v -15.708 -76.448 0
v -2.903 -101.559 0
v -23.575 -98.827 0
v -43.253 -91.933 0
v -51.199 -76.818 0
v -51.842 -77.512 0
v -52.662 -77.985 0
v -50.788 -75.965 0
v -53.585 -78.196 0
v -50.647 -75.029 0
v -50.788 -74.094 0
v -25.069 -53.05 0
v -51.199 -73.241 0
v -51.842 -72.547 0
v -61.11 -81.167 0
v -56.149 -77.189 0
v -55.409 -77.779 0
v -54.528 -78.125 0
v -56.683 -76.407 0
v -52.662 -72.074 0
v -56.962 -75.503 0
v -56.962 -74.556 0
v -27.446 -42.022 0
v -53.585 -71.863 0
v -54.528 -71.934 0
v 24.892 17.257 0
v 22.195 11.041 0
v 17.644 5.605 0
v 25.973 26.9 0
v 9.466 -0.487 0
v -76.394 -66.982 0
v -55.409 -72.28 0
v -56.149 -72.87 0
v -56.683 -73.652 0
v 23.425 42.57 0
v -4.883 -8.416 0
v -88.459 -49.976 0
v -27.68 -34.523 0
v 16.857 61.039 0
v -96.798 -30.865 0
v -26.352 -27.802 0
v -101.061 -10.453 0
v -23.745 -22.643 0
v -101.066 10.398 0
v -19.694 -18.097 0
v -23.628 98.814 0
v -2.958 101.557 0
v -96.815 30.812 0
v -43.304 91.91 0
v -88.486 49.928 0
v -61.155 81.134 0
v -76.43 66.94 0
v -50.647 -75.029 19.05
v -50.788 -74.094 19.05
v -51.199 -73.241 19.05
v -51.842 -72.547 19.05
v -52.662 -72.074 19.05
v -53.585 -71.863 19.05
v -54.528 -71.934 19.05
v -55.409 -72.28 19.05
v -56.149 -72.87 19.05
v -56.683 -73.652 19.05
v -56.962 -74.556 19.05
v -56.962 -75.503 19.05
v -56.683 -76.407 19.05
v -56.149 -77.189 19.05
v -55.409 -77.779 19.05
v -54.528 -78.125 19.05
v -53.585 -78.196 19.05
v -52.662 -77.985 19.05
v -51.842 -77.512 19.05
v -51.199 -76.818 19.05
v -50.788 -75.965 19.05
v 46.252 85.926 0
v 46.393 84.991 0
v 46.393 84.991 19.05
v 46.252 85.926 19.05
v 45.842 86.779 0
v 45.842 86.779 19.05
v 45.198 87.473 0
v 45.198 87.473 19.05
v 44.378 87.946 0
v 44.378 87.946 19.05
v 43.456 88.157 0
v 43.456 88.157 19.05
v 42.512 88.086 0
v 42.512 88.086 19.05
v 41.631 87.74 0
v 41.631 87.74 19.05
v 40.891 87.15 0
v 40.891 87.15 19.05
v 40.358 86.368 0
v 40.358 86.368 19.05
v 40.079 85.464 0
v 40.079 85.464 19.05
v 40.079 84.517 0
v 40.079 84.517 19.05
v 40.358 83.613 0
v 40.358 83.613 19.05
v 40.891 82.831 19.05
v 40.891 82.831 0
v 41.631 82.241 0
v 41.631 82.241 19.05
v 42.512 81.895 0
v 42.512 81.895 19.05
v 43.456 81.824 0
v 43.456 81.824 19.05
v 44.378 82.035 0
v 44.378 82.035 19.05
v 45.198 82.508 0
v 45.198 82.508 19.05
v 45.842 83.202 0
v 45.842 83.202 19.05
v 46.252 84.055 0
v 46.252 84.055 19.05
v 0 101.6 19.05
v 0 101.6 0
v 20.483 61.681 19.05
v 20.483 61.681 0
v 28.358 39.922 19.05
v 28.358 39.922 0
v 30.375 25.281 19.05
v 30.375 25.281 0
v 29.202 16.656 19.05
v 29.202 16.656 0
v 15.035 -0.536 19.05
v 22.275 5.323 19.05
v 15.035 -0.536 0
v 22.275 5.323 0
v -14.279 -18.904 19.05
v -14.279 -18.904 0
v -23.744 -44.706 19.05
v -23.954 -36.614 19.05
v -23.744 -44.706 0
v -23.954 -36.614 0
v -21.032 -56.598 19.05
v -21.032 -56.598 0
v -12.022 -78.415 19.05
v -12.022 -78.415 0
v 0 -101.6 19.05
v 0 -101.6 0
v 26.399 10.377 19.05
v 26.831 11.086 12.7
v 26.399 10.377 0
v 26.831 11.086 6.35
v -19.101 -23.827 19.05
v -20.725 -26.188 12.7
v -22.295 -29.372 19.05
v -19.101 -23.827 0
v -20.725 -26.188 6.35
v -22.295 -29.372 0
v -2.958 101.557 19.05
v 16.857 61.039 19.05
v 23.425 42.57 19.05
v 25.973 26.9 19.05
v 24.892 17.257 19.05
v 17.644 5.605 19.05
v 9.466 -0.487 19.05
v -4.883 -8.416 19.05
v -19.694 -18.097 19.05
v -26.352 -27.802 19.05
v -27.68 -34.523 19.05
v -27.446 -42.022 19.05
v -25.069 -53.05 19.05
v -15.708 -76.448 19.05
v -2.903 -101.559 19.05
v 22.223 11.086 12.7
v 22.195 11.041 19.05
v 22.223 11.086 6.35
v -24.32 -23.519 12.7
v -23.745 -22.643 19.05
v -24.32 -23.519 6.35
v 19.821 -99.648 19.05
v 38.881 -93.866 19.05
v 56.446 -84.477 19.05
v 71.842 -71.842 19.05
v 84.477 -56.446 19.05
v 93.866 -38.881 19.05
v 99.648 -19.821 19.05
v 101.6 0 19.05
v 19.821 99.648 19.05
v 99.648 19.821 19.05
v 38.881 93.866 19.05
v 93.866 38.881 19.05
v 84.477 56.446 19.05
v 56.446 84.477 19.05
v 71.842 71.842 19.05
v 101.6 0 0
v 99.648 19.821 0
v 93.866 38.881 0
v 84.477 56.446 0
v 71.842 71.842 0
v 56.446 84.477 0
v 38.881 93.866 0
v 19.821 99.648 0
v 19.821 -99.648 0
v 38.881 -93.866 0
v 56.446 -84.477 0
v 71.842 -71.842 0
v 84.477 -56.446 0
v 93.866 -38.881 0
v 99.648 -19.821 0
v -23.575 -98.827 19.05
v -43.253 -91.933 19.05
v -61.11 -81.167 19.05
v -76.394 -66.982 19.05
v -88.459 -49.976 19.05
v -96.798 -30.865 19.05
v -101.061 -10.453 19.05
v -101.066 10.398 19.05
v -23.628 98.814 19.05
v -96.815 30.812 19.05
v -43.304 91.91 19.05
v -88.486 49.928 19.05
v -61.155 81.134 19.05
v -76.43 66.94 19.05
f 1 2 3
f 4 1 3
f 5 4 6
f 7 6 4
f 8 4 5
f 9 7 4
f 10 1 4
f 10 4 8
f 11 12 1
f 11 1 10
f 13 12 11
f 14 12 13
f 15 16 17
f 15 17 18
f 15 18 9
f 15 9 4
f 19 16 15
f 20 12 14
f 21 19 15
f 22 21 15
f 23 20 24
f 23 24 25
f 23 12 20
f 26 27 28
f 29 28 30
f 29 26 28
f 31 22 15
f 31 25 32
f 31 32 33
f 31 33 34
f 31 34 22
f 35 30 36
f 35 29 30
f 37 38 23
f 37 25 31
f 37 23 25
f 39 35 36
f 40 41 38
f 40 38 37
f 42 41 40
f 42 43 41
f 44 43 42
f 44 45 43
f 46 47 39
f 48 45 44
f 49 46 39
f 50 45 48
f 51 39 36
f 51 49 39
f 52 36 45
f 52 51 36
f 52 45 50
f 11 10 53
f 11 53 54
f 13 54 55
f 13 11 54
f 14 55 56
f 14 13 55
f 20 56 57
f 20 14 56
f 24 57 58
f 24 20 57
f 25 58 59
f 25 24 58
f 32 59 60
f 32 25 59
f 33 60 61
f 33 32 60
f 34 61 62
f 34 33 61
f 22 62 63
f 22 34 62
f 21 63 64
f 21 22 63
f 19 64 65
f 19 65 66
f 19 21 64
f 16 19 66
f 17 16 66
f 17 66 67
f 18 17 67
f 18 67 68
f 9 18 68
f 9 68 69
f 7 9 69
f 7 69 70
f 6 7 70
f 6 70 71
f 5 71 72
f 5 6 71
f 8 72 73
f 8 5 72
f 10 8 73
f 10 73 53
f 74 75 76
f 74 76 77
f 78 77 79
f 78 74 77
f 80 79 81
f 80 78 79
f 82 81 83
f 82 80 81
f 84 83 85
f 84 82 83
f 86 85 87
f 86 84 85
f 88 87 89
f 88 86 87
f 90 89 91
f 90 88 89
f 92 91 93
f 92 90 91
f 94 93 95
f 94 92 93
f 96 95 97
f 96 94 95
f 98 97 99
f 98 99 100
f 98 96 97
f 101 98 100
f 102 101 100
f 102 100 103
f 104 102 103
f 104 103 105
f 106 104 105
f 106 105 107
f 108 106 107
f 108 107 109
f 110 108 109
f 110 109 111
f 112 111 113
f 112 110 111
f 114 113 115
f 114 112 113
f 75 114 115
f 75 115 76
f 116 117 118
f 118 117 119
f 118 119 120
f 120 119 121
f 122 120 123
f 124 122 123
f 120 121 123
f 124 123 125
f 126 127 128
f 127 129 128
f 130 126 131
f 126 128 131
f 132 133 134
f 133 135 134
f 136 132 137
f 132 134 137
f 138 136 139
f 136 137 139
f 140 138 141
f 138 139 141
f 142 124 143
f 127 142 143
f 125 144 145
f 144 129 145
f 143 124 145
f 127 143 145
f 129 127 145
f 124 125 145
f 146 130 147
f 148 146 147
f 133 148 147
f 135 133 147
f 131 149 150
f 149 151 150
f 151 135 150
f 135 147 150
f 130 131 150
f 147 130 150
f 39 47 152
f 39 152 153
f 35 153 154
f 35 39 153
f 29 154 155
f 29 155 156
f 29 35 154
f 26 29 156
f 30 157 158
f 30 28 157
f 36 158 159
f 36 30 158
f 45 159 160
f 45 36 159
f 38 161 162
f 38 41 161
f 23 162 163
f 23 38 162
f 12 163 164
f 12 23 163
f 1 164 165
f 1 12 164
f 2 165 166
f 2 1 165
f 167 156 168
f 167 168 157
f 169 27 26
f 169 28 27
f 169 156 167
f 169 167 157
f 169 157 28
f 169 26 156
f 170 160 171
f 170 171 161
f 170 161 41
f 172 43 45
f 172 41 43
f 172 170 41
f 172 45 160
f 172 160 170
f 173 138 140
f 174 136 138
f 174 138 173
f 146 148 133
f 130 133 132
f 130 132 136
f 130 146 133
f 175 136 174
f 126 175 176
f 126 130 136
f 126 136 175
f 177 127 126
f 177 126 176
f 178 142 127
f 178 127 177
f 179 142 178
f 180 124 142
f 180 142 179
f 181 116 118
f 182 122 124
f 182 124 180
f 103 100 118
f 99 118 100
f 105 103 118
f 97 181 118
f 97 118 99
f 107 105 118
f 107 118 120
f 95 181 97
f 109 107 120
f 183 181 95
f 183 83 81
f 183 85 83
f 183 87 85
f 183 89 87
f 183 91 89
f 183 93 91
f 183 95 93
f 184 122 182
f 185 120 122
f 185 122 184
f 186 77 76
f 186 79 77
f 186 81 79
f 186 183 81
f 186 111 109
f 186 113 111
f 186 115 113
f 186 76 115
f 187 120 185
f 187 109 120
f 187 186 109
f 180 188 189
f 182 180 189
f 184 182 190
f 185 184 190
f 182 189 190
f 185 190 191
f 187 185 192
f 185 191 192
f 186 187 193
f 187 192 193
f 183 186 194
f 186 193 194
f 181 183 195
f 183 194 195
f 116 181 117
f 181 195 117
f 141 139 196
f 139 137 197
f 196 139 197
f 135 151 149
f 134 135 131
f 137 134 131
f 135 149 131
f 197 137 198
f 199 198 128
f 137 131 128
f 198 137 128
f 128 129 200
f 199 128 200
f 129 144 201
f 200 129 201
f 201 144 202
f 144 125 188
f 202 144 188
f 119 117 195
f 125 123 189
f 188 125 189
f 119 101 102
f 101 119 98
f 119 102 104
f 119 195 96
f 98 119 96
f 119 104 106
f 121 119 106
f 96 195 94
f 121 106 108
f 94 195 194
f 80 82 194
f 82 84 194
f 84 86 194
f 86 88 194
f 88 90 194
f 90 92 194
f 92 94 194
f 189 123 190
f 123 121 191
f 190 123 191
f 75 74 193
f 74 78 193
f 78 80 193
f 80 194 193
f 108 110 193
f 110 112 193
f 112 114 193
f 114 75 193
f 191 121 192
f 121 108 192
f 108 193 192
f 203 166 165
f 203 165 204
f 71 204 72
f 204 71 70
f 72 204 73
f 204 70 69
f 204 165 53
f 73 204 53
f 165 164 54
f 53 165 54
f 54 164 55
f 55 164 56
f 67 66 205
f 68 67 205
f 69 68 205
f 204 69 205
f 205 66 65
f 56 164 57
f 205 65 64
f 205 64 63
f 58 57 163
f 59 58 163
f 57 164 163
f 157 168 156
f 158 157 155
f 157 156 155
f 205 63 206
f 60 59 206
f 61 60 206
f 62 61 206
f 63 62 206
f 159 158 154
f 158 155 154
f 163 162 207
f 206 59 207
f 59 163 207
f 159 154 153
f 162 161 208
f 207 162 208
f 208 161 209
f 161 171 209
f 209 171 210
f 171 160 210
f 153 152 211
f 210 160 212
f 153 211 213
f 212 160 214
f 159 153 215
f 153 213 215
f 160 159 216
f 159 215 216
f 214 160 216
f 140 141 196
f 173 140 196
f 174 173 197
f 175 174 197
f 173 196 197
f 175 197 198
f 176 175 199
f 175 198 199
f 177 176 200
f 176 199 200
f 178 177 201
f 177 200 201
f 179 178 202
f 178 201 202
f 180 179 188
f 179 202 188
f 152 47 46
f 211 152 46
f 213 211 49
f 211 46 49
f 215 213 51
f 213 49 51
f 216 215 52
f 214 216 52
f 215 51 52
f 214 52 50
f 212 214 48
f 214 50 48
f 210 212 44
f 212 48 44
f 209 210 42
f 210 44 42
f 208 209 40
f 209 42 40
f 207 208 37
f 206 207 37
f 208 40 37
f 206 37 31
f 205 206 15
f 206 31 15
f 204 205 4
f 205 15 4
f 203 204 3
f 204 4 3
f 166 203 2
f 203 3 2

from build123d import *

# Parameters (mm, degrees)
F0_R     = 3.175
F1_DEPTH = 19.05


with BuildPart() as f1:
    # F0 (on Top) → F1 (new body)
    with BuildSketch(Plane.XY):
        with BuildLine():
            add(Edge.make_bspline(
                [(-2.9580479616, 101.5569296122), (15.5843384631, 65.9604681211), (48.7024471051, 2.305474415), (-48.5613333289, -14.8828659922), (-18.9403117953, -71.1167733007), (-2.9026756141, -101.5585273341)],
                knots=[0, 0, 0, 0, 0.3684374392, 0.6579810043, 1, 1, 1, 1], degree=3))
            ThreePointArc((-2.9580479616, 101.5569296122), (-101.5999962246, -0.0276976966), (-2.9026756141, -101.5585273341))
        make_face()
        with Locations((-53.8219884038, -75.0294551253)):
            Circle(F0_R, mode=Mode.SUBTRACT)
    extrude(amount=F1_DEPTH)


with BuildPart() as f1b:
    # F0 (on Top) → F1, piece 2 (new body)
    with BuildSketch(Plane.XY):
        with BuildLine():
            ThreePointArc((0, -101.6), (71.8420489686, -71.8420489686), (101.6, 0))
            ThreePointArc((101.6, 0), (71.8420489686, 71.8420489686), (0, 101.6))
            add(Edge.make_bspline(
                [(0, 101.6), (19.2480204904, 66.3102755707), (53.8947404226, 2.7882526491), (-44.7467021137, -17.9465343866), (-15.5426027285, -72.5432757842), (0, -101.6)],
                knots=[0, 0, 0, 0, 0.3689782792, 0.6641663285, 1, 1, 1, 1], degree=3))
        make_face()
        with Locations((43.2182513177, 84.9905461073)):
            Circle(F0_R, mode=Mode.SUBTRACT)
    extrude(amount=F1_DEPTH)


solid = Compound([f1.part, f1b.part])
